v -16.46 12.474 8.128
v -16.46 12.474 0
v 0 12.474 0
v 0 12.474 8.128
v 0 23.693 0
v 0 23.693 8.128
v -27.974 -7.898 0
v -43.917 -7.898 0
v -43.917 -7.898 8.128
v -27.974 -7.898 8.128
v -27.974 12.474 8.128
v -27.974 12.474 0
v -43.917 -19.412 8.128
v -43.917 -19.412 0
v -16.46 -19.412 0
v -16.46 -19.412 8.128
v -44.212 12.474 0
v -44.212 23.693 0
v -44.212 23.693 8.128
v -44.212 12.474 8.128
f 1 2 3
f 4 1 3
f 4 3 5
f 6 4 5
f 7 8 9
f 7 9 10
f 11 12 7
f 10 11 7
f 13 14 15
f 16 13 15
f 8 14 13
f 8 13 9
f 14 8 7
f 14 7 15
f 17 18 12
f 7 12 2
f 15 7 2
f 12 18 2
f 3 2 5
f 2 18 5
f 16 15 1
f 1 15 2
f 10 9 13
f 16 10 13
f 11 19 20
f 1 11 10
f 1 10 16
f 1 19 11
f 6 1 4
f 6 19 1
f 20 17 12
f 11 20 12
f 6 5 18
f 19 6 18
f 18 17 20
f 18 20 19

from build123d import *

# Parameters (mm, degrees)
F0_W     = 16.238193959
F0_H     = 11.2191159278
F0_W_2   = 11.5143544972
F0_W_3   = 16.459621489
F0_H_2   = 20.3715497628
F0_H_3   = 11.5143535659
F0_W_4   = 15.942953527
F1_DEPTH = 8.128


with BuildPart() as f1:
    # F0 (on Top) → F1 (new body)
    with BuildSketch(Plane.XY):
        with Locations((-36.0930729657, 18.0834410712)):
            Rectangle(F0_W, F0_H)
        with Locations((-22.2167987376, 18.0834410712)):
            Rectangle(F0_W_2, F0_H)
        with Locations((-8.2298107445, 18.0834410712)):
            Rectangle(F0_W_3, F0_H)
        with Locations((-22.2167987376, 2.2881082259)):
            Rectangle(F0_W_2, F0_H_2)
        with Locations((-22.2167987376, -13.6548434384)):
            Rectangle(F0_W_2, F0_H_3)
        with Locations((-35.9454527497, -13.6548434384)):
            Rectangle(F0_W_4, F0_H_3)
    extrude(amount=F1_DEPTH)


solid = f1.part
